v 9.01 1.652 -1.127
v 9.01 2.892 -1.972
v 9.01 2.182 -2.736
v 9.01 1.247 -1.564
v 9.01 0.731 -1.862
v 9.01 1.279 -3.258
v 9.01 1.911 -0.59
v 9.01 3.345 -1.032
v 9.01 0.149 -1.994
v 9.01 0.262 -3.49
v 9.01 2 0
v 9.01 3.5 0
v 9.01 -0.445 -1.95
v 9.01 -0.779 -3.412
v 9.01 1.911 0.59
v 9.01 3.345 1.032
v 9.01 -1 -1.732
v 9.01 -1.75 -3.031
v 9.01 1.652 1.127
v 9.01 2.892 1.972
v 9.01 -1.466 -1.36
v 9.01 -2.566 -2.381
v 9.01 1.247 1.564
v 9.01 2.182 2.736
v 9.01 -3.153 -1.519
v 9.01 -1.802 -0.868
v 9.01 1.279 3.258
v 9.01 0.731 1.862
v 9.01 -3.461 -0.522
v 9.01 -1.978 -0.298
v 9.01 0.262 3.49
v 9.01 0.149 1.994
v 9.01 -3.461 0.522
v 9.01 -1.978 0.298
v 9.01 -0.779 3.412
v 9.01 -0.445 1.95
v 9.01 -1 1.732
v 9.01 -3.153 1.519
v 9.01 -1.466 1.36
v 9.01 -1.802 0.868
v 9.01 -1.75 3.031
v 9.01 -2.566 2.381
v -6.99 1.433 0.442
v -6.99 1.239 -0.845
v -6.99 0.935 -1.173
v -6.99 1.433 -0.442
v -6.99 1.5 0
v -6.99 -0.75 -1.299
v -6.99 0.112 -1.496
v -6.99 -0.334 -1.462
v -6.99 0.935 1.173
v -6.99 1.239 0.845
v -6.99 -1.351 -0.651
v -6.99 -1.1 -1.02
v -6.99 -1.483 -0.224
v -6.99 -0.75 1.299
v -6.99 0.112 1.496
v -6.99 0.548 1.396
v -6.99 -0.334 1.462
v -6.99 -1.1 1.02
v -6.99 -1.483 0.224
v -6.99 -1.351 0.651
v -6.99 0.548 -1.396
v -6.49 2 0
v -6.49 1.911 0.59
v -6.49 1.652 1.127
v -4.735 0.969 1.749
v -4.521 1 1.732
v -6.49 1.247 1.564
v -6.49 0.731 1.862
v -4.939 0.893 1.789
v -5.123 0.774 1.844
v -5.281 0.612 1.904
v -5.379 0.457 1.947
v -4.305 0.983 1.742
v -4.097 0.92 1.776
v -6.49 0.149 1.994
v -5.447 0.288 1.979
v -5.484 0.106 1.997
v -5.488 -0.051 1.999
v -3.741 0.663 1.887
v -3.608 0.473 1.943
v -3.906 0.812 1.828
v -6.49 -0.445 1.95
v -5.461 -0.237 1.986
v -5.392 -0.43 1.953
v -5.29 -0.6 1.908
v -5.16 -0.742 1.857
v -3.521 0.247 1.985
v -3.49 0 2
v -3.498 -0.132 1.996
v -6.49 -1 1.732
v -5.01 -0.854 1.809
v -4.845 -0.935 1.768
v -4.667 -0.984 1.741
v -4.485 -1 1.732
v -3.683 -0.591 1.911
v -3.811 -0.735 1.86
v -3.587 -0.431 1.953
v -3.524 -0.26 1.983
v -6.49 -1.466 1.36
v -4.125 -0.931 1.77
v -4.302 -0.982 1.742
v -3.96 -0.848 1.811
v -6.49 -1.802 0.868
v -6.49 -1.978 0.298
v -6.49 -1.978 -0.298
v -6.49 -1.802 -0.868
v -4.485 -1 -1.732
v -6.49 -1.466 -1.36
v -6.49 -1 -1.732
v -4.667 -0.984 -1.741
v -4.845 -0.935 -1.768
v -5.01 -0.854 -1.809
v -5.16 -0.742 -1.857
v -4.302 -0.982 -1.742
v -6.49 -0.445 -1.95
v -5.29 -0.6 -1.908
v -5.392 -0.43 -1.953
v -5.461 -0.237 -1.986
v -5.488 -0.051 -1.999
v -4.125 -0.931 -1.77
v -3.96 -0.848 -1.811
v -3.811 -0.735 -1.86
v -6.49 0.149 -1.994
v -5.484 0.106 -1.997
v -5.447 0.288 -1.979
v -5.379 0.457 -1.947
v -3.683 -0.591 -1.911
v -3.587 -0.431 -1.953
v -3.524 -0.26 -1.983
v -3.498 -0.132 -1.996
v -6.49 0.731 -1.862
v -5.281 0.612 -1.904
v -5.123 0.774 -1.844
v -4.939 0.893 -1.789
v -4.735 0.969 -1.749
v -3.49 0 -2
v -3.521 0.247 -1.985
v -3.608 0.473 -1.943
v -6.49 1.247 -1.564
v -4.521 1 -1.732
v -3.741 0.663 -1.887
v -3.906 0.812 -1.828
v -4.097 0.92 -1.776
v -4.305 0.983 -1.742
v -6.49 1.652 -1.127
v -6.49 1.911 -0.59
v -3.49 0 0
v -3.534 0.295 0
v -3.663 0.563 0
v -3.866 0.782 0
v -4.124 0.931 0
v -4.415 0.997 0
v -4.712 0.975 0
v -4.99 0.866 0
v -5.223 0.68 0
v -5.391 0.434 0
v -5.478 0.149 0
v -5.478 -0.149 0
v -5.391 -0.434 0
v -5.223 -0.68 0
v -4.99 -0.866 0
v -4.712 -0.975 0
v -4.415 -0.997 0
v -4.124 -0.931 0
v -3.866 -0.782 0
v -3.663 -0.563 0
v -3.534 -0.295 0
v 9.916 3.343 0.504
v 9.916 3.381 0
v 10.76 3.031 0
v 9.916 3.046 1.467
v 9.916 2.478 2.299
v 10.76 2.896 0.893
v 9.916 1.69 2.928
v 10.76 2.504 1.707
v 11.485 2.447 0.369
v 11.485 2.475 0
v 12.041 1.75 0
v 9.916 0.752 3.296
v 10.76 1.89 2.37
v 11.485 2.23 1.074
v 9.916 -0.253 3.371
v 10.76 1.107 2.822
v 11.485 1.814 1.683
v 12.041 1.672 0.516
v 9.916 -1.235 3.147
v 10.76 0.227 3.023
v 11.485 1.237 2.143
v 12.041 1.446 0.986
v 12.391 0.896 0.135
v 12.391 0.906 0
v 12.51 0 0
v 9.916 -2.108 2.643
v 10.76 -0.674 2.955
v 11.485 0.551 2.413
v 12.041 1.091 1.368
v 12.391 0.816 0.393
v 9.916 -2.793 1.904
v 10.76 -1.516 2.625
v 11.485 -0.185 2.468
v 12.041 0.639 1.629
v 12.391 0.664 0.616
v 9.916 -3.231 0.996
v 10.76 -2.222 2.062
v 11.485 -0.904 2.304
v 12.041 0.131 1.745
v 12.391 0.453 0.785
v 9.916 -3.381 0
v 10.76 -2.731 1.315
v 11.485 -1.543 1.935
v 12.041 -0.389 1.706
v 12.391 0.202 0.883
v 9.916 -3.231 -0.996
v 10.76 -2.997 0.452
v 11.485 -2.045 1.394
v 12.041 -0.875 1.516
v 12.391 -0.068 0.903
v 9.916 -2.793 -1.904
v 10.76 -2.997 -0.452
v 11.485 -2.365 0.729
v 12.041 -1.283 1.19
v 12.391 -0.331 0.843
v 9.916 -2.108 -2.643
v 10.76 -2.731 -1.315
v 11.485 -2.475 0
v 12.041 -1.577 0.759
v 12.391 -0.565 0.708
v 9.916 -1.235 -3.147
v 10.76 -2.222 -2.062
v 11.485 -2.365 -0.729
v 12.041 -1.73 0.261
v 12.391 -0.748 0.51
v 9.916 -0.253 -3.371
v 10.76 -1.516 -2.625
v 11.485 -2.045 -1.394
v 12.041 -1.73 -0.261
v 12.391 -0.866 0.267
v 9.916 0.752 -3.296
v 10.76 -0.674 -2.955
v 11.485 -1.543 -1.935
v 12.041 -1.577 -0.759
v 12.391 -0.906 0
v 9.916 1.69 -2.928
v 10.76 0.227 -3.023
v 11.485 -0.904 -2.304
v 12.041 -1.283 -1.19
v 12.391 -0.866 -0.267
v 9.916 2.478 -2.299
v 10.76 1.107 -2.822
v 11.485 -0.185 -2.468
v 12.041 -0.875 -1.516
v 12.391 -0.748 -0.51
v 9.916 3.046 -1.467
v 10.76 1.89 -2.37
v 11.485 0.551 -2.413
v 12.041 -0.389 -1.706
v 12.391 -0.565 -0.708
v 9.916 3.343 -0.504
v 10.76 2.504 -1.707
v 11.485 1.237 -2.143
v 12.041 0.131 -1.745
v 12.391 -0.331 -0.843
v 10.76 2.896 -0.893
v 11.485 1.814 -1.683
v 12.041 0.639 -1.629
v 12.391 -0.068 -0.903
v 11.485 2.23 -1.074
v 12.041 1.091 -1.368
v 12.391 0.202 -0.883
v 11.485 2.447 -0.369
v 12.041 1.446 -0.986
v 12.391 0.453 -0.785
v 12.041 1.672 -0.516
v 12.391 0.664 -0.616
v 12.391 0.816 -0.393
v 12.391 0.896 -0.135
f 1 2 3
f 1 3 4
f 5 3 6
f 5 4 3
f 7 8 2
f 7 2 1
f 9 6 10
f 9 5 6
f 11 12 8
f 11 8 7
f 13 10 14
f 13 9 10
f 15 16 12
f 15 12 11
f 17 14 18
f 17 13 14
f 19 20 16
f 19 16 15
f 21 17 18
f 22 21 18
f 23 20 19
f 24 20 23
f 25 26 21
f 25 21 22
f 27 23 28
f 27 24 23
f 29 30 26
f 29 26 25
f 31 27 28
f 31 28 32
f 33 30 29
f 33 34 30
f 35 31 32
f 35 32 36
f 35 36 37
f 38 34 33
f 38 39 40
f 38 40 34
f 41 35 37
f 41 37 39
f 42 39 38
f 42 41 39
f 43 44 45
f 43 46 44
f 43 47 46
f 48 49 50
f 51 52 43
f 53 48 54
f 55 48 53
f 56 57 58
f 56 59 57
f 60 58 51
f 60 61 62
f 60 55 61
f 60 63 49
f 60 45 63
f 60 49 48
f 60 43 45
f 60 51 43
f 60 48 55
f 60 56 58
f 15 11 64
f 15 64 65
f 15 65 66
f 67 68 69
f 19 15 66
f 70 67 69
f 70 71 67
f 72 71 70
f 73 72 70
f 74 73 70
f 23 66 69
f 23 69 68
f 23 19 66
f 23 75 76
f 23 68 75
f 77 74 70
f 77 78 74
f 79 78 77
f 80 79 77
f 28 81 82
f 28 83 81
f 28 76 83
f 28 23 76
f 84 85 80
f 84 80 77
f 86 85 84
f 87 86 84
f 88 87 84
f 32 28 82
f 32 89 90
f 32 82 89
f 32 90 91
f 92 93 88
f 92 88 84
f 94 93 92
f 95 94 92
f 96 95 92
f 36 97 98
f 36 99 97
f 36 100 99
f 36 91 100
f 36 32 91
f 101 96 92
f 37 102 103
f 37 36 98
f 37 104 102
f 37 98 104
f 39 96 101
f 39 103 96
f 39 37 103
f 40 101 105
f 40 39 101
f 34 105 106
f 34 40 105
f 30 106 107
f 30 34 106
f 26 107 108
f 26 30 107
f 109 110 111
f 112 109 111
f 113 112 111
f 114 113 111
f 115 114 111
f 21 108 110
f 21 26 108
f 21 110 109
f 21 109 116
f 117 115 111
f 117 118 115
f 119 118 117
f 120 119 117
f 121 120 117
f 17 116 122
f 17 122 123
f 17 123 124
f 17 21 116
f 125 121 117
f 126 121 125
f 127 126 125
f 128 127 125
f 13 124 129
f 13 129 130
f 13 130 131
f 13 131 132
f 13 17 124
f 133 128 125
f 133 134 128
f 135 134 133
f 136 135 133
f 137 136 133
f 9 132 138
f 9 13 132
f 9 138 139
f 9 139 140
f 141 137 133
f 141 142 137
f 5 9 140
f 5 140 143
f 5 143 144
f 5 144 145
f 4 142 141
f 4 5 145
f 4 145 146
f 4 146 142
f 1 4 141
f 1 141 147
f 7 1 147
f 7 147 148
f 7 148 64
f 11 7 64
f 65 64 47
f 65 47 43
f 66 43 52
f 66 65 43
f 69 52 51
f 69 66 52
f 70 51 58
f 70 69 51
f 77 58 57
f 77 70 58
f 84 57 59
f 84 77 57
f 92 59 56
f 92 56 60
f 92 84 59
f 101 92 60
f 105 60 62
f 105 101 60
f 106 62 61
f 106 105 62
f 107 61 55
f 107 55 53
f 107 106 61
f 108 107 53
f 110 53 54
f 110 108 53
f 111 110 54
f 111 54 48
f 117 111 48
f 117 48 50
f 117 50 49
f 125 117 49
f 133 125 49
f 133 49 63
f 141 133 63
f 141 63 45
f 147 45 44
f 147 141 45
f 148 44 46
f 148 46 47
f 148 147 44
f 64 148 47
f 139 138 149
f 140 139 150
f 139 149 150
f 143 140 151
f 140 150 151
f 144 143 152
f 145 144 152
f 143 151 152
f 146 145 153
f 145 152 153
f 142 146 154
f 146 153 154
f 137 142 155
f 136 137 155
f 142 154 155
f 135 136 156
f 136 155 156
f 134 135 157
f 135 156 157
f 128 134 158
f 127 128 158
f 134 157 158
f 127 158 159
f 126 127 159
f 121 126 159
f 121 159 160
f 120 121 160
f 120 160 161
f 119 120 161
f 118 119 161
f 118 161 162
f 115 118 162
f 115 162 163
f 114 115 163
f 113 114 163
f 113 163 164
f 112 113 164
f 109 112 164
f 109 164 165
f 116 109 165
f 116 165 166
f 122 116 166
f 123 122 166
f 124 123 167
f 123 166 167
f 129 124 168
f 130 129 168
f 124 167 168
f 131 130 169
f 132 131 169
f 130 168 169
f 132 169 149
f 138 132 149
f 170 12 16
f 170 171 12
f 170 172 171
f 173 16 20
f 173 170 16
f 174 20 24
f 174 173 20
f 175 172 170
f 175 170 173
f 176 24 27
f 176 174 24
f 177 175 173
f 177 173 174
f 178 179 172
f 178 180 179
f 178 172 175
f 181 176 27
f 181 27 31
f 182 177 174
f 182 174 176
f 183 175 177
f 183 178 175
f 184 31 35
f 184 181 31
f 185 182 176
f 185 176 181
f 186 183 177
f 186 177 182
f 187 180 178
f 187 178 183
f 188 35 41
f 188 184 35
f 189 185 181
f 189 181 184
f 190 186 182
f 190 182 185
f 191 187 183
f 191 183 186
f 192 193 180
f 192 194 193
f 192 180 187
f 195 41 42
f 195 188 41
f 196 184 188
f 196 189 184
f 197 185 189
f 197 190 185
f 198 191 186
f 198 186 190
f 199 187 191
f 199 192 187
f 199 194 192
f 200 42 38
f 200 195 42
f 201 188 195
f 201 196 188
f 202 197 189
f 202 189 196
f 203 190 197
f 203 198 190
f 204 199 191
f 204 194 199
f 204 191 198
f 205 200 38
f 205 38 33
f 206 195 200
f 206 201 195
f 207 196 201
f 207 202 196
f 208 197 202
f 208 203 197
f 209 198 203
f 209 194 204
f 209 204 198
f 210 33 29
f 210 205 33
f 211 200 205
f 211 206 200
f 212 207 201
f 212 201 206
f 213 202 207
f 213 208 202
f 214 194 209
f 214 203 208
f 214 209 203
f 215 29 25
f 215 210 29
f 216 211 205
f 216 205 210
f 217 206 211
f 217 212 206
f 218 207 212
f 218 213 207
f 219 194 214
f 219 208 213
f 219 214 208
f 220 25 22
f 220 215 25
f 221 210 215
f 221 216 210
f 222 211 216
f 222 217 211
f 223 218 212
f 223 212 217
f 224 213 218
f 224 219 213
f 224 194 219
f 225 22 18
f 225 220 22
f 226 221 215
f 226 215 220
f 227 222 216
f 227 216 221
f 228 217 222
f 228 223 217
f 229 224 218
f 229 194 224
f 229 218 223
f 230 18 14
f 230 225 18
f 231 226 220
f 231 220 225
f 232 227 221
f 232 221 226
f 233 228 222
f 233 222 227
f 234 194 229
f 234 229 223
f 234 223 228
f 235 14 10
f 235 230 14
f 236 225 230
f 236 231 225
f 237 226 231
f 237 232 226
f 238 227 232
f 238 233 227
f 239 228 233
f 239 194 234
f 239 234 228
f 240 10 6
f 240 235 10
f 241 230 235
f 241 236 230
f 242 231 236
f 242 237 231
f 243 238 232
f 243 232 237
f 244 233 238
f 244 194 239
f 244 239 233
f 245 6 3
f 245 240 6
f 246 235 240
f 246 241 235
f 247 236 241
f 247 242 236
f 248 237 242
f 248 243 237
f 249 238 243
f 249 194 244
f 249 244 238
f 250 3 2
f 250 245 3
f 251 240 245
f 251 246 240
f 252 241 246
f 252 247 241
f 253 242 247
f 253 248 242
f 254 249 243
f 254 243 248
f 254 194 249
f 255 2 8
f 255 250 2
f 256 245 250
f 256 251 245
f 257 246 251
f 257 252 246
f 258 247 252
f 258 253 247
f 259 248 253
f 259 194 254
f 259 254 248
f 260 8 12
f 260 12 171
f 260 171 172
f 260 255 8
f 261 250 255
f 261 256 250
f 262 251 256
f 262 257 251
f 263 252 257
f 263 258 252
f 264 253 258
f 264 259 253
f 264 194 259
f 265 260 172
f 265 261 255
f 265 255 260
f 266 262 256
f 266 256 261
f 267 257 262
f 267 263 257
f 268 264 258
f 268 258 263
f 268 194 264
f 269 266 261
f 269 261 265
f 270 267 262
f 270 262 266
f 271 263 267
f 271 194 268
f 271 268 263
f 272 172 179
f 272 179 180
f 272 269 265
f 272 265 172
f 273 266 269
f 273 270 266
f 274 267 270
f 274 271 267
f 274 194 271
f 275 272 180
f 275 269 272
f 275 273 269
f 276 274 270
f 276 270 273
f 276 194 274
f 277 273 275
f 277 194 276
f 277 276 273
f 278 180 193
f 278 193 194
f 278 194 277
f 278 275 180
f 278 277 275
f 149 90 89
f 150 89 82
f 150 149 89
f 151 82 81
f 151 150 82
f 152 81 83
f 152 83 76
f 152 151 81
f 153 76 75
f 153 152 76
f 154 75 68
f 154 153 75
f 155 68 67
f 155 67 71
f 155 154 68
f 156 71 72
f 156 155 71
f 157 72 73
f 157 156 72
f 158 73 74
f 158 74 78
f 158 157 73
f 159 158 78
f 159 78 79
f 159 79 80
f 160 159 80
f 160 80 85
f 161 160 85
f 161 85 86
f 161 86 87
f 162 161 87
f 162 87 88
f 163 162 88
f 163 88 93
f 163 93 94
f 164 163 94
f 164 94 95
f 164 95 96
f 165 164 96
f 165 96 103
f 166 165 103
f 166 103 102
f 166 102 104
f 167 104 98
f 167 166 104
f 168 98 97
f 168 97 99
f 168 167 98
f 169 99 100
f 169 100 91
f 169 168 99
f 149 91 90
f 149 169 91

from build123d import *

# Parameters (mm, degrees)
CHAMFER1_SIZE           = 0.5
SKETCH2_R               = 1
CUT_EXTRUDE1_DEPTH      = 4.5
CUT_EXTRUDE1_DEPTH_BACK = 4.5


with BuildPart() as part:
    # Sketch1 → Revolve1 (revolve)
    with BuildSketch(Plane.XY):
        with BuildLine():
            Line((-6.989590942, 0), (-6.989590942, 2))
            Line((-6.989590942, 2), (9.010409058, 2))
            Line((9.010409058, 2), (9.010409058, 3.5))
            ThreePointArc((9.010409058, 3.5), (11.485282792, 2.474873734), (12.510409058, 0))
            Line((12.510409058, 0), (-6.989590942, 0))
        make_face()
    revolve(axis=Axis((-10.070672023, 0, 0), (1, 0, 0)))

    # Chamfer1
    chamfer1_edges = [part.edges().sort_by_distance(p)[0] for p in [
        (-6.989590942, -2, 0),
    ]]
    chamfer(chamfer1_edges, length=CHAMFER1_SIZE)

    # Sketch2 → Cut-Extrude1 (cut, two sides)
    with BuildSketch(Plane.XY) as cut_extrude1_sk:
        with Locations((-4.489590942, 0)):
            Circle(SKETCH2_R)
    extrude(amount=CUT_EXTRUDE1_DEPTH, mode=Mode.SUBTRACT)
    extrude(cut_extrude1_sk.sketch, amount=-CUT_EXTRUDE1_DEPTH_BACK, mode=Mode.SUBTRACT)


solid = part.part
